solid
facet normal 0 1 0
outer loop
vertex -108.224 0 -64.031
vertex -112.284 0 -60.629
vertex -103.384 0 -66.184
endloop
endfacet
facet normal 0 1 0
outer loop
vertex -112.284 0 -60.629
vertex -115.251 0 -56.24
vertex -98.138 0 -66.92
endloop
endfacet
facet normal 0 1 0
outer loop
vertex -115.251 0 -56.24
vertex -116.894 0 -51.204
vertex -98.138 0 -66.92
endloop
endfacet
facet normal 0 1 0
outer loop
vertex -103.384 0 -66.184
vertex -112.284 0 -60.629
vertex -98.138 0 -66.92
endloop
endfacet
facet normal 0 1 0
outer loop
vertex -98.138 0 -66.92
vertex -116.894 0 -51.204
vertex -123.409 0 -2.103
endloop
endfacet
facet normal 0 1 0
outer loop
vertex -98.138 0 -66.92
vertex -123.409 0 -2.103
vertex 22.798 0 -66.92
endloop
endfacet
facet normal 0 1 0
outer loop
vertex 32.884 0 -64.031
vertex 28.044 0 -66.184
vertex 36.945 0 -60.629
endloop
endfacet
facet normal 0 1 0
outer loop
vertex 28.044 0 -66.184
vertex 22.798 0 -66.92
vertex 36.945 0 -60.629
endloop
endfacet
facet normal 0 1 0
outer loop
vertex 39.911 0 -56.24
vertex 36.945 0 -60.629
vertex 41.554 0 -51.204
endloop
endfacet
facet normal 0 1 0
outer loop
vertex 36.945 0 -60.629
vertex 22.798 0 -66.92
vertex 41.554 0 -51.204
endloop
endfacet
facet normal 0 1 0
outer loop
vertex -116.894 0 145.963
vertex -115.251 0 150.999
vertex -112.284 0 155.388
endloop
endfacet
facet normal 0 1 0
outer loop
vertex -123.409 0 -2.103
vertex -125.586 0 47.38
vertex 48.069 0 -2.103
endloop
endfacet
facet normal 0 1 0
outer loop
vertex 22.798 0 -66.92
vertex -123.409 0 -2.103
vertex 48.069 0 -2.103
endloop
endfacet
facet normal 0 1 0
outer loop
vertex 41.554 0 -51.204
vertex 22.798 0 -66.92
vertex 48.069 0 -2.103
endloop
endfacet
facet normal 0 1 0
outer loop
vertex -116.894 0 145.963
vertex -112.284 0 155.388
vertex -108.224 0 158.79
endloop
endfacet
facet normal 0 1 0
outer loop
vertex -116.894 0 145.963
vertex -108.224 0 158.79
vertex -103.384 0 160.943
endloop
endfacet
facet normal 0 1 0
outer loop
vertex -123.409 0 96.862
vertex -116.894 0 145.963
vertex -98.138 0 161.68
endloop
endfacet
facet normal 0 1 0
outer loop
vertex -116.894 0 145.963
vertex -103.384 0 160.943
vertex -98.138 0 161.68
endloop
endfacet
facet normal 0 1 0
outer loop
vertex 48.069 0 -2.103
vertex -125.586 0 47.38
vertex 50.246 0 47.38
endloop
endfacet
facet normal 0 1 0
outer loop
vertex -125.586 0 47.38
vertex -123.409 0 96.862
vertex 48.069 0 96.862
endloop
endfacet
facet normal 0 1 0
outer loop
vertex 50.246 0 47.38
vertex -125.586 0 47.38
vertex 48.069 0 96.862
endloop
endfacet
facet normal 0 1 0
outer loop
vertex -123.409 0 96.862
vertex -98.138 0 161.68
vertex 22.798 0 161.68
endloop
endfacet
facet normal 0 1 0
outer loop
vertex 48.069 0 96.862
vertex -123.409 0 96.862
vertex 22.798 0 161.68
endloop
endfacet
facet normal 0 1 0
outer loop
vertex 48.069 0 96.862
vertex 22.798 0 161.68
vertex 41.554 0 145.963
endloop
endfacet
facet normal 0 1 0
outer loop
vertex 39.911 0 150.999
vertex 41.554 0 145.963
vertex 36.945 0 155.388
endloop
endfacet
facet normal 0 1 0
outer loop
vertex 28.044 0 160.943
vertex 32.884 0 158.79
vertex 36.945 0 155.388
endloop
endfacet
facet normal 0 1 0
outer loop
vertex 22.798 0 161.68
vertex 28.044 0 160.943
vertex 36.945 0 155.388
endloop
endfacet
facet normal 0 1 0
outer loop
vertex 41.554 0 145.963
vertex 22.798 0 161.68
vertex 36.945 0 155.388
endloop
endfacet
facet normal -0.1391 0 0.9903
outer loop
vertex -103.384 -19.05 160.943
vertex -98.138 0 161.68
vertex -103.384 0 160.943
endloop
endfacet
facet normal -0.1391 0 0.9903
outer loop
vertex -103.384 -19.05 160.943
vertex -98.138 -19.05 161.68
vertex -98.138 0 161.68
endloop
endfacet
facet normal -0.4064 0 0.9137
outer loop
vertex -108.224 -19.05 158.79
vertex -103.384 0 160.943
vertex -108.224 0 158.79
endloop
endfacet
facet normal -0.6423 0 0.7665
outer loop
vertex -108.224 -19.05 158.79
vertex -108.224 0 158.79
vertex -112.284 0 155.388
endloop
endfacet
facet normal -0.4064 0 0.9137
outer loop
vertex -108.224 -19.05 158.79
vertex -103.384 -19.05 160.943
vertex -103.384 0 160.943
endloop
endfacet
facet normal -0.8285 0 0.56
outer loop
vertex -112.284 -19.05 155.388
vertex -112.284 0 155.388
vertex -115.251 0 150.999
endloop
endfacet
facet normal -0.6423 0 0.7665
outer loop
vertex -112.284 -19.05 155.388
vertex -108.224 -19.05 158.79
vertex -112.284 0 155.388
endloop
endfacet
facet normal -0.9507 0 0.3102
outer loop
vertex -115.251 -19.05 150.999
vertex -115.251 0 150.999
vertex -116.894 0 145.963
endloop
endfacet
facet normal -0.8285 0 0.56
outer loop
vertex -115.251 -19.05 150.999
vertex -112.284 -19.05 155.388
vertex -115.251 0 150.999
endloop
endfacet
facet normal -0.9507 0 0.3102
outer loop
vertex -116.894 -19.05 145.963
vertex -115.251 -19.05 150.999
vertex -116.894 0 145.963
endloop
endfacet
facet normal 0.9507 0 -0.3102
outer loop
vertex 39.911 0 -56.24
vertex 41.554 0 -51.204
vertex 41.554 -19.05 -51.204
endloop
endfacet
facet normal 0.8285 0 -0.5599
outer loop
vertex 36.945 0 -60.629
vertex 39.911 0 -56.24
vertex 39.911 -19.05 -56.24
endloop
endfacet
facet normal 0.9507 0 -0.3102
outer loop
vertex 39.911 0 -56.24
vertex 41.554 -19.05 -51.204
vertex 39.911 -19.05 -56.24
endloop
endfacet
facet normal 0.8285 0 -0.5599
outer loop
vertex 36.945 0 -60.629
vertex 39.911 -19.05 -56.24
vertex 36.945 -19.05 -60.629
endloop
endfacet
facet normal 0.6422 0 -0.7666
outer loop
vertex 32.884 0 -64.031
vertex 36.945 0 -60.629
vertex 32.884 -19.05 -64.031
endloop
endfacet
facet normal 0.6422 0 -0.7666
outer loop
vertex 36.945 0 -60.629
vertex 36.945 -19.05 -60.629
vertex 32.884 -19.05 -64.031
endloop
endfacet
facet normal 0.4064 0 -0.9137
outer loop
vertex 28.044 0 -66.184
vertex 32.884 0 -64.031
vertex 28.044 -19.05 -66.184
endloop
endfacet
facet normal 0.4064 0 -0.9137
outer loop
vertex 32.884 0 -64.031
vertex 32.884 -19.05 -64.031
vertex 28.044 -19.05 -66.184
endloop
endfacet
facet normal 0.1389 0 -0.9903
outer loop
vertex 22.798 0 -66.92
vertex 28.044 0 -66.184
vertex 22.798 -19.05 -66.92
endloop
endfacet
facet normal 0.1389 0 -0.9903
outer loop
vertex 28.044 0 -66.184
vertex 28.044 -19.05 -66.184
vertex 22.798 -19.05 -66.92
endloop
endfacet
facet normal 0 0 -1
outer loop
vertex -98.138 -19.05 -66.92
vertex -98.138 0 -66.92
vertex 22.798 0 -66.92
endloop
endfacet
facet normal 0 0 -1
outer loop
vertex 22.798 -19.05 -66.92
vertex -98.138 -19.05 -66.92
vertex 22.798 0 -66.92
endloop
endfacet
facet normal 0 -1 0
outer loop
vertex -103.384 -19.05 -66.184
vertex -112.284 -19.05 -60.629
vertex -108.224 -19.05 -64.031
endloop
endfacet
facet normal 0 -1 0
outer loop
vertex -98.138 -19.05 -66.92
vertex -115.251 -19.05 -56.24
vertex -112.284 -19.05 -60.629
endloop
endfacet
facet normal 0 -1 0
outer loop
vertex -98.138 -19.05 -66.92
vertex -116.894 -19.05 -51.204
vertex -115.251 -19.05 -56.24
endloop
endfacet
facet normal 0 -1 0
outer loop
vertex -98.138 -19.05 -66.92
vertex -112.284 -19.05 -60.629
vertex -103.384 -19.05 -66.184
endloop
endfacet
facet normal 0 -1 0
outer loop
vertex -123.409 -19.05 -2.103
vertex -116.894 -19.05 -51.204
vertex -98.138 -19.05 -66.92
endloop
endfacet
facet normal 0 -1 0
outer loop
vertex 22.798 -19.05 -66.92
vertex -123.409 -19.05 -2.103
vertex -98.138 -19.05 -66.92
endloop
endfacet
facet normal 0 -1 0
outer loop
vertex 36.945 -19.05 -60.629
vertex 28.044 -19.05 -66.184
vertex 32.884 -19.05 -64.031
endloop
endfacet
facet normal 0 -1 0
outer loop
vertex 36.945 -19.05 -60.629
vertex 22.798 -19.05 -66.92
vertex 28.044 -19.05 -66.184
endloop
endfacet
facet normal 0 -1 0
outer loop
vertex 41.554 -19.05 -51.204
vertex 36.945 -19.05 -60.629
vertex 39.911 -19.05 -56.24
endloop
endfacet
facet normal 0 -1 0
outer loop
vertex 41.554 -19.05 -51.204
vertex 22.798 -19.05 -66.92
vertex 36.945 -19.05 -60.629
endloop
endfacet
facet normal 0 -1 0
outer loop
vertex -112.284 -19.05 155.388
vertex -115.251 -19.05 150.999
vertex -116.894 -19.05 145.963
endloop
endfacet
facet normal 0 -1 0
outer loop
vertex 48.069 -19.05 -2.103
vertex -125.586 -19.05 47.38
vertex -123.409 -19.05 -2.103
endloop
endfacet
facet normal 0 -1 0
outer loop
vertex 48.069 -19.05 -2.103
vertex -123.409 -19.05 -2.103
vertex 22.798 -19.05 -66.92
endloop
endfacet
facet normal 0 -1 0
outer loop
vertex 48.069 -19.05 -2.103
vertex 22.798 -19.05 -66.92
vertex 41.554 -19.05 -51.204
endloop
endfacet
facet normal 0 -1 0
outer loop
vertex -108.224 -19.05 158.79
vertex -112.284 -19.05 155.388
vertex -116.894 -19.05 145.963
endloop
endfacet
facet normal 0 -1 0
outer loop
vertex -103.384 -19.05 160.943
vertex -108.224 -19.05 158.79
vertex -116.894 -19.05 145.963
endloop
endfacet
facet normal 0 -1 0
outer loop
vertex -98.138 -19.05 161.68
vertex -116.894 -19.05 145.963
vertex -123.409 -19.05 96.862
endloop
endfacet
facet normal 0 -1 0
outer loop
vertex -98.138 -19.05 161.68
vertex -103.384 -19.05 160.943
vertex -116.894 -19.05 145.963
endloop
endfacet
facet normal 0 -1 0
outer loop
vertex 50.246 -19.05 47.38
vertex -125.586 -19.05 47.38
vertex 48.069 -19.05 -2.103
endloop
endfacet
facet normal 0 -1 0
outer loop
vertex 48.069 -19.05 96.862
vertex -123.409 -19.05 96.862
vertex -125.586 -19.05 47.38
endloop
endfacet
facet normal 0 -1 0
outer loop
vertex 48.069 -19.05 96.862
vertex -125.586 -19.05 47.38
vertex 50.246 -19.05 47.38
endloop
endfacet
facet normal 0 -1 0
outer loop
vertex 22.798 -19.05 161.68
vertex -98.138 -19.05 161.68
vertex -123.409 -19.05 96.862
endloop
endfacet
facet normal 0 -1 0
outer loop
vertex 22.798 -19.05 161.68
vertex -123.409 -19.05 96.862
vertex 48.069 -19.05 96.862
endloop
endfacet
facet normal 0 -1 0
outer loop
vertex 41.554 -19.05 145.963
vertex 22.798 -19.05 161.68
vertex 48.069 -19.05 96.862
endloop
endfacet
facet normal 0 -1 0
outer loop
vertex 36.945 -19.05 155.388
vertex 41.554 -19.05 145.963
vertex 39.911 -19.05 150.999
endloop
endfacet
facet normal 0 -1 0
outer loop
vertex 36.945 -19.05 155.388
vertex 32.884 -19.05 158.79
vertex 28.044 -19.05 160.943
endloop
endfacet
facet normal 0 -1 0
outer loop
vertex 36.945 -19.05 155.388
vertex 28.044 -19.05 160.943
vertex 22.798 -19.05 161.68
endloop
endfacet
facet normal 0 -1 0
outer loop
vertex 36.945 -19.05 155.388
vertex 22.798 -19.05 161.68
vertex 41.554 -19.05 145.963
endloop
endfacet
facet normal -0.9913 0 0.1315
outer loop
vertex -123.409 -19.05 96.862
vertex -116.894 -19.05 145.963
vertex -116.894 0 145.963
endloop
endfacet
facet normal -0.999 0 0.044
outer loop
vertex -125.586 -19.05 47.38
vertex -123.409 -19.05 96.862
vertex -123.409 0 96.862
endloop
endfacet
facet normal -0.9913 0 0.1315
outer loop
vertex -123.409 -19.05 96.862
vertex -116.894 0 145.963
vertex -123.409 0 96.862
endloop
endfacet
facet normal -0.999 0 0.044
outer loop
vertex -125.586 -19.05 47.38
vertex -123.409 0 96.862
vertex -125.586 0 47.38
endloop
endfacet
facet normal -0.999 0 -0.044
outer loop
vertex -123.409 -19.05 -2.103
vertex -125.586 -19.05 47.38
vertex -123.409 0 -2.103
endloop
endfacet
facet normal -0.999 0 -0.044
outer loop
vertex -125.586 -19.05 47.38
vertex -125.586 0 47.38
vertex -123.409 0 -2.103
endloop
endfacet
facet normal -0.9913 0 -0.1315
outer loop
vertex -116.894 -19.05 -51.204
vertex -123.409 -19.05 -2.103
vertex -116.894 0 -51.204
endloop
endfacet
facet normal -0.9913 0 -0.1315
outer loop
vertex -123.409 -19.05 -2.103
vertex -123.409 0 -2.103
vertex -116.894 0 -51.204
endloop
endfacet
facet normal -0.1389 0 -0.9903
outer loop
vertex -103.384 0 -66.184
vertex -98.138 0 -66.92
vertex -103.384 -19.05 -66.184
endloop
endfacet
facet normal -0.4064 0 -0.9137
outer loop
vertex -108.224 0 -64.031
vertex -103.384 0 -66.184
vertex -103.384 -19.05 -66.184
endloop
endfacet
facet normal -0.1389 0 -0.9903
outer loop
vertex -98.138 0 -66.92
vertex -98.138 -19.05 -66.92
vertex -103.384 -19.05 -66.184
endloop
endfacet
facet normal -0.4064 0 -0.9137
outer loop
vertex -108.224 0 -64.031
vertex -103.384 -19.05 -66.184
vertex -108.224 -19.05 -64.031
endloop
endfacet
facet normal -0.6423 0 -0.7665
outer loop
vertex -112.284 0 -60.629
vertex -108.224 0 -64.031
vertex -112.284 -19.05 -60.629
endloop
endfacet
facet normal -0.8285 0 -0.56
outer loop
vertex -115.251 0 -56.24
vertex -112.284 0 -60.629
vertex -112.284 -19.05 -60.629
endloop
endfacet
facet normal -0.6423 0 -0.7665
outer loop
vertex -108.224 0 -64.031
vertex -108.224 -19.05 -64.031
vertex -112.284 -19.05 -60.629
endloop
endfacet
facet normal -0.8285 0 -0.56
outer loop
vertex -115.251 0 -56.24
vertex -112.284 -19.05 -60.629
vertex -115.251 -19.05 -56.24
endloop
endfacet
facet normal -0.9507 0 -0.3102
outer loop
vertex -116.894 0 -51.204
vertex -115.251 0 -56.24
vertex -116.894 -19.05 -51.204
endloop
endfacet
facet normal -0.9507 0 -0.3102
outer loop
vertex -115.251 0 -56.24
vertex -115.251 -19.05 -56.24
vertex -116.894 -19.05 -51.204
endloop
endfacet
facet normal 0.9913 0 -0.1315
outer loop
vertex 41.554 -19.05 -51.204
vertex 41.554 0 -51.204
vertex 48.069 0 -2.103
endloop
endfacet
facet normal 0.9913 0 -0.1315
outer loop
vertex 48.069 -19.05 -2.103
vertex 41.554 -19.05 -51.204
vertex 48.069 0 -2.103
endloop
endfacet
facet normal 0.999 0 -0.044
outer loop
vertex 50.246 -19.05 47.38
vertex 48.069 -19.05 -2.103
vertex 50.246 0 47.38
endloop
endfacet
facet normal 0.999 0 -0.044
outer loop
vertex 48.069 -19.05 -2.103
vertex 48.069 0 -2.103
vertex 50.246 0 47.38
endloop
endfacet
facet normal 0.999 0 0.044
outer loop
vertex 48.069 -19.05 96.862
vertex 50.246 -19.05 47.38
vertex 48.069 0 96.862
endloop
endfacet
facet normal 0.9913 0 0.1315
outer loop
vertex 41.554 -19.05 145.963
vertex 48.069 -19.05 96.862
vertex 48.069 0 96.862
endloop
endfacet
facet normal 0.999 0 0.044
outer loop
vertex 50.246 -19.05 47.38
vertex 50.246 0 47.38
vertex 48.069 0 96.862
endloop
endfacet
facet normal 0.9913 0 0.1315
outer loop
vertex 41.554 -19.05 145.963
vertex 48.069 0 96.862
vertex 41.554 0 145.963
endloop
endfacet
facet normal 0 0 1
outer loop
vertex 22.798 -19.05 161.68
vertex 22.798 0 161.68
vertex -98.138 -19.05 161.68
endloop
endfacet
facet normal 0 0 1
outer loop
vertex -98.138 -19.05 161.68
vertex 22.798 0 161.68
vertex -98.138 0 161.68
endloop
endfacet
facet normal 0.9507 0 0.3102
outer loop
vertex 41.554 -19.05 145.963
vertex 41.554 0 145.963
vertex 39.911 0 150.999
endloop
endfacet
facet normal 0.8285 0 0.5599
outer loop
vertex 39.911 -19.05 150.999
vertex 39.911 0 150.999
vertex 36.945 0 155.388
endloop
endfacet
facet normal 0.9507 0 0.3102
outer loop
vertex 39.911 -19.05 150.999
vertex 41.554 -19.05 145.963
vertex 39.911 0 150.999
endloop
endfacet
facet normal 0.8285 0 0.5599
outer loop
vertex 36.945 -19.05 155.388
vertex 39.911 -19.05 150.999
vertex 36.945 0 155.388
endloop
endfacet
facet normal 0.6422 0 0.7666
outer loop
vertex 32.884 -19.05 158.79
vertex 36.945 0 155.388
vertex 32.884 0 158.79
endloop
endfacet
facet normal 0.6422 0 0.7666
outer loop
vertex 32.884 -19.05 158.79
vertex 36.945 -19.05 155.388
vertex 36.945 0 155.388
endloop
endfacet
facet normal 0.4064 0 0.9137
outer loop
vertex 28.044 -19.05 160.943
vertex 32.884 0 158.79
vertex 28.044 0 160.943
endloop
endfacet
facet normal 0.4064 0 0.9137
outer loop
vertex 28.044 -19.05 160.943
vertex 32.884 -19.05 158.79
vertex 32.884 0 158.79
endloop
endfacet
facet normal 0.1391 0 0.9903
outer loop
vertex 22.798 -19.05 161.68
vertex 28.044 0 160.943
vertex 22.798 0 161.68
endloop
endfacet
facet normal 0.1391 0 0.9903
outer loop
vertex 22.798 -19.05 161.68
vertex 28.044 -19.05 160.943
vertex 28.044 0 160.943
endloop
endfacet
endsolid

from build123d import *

# Parameters (mm, degrees)
F1_DEPTH = 19.05
F2_DEPTH = 19.05
F3_DEPTH = 19.05
F4_R     = 19.05


with BuildPart() as f1:
    # F0 (on Front) → F1 (new body)
    with BuildSketch(Plane.XZ):
        Polygon((-92.987883, 161.679518), (-113.869874, 161.679518), (-113.869874, -66.920482), (-99.337883, -66.920482), (-92.987883, -66.920482), (-81.616402, -66.920482), (-75.266402, -66.920482), (38.530126, -66.920482), (38.530126, 161.679518), (-81.616402, 161.679518), align=None)
    extrude(amount=F1_DEPTH)

    # F0 (on Front) → F2 (join)
    with BuildSketch(Plane.XZ):
        with BuildLine():
            Line((-113.869874, -66.920482), (-113.869874, 161.679518))
            ThreePointArc((-113.869874, 161.679518), (-125.585738, 47.379518), (-113.869874, -66.920482))
        make_face()
    extrude(amount=F2_DEPTH)

    # F0 (on Front) → F3 (join)
    with BuildSketch(Plane.XZ):
        with BuildLine():
            ThreePointArc((38.530126, -66.920482), (50.245991, 47.379518), (38.530126, 161.679518))
            Line((38.530126, 161.679518), (38.530126, -66.920482))
        make_face()
    extrude(amount=F3_DEPTH)

    # F4
    f4_edges = [f1.edges().sort_by_distance(p)[0] for p in [
        (-113.869874, -9.525, 161.679518),
        (38.530126, -9.525, 161.679518),
        (38.530126, -9.525, -66.920482),
        (-113.869874, -9.525, -66.920482),
    ]]
    fillet(f4_edges, radius=F4_R)


solid = f1.part
